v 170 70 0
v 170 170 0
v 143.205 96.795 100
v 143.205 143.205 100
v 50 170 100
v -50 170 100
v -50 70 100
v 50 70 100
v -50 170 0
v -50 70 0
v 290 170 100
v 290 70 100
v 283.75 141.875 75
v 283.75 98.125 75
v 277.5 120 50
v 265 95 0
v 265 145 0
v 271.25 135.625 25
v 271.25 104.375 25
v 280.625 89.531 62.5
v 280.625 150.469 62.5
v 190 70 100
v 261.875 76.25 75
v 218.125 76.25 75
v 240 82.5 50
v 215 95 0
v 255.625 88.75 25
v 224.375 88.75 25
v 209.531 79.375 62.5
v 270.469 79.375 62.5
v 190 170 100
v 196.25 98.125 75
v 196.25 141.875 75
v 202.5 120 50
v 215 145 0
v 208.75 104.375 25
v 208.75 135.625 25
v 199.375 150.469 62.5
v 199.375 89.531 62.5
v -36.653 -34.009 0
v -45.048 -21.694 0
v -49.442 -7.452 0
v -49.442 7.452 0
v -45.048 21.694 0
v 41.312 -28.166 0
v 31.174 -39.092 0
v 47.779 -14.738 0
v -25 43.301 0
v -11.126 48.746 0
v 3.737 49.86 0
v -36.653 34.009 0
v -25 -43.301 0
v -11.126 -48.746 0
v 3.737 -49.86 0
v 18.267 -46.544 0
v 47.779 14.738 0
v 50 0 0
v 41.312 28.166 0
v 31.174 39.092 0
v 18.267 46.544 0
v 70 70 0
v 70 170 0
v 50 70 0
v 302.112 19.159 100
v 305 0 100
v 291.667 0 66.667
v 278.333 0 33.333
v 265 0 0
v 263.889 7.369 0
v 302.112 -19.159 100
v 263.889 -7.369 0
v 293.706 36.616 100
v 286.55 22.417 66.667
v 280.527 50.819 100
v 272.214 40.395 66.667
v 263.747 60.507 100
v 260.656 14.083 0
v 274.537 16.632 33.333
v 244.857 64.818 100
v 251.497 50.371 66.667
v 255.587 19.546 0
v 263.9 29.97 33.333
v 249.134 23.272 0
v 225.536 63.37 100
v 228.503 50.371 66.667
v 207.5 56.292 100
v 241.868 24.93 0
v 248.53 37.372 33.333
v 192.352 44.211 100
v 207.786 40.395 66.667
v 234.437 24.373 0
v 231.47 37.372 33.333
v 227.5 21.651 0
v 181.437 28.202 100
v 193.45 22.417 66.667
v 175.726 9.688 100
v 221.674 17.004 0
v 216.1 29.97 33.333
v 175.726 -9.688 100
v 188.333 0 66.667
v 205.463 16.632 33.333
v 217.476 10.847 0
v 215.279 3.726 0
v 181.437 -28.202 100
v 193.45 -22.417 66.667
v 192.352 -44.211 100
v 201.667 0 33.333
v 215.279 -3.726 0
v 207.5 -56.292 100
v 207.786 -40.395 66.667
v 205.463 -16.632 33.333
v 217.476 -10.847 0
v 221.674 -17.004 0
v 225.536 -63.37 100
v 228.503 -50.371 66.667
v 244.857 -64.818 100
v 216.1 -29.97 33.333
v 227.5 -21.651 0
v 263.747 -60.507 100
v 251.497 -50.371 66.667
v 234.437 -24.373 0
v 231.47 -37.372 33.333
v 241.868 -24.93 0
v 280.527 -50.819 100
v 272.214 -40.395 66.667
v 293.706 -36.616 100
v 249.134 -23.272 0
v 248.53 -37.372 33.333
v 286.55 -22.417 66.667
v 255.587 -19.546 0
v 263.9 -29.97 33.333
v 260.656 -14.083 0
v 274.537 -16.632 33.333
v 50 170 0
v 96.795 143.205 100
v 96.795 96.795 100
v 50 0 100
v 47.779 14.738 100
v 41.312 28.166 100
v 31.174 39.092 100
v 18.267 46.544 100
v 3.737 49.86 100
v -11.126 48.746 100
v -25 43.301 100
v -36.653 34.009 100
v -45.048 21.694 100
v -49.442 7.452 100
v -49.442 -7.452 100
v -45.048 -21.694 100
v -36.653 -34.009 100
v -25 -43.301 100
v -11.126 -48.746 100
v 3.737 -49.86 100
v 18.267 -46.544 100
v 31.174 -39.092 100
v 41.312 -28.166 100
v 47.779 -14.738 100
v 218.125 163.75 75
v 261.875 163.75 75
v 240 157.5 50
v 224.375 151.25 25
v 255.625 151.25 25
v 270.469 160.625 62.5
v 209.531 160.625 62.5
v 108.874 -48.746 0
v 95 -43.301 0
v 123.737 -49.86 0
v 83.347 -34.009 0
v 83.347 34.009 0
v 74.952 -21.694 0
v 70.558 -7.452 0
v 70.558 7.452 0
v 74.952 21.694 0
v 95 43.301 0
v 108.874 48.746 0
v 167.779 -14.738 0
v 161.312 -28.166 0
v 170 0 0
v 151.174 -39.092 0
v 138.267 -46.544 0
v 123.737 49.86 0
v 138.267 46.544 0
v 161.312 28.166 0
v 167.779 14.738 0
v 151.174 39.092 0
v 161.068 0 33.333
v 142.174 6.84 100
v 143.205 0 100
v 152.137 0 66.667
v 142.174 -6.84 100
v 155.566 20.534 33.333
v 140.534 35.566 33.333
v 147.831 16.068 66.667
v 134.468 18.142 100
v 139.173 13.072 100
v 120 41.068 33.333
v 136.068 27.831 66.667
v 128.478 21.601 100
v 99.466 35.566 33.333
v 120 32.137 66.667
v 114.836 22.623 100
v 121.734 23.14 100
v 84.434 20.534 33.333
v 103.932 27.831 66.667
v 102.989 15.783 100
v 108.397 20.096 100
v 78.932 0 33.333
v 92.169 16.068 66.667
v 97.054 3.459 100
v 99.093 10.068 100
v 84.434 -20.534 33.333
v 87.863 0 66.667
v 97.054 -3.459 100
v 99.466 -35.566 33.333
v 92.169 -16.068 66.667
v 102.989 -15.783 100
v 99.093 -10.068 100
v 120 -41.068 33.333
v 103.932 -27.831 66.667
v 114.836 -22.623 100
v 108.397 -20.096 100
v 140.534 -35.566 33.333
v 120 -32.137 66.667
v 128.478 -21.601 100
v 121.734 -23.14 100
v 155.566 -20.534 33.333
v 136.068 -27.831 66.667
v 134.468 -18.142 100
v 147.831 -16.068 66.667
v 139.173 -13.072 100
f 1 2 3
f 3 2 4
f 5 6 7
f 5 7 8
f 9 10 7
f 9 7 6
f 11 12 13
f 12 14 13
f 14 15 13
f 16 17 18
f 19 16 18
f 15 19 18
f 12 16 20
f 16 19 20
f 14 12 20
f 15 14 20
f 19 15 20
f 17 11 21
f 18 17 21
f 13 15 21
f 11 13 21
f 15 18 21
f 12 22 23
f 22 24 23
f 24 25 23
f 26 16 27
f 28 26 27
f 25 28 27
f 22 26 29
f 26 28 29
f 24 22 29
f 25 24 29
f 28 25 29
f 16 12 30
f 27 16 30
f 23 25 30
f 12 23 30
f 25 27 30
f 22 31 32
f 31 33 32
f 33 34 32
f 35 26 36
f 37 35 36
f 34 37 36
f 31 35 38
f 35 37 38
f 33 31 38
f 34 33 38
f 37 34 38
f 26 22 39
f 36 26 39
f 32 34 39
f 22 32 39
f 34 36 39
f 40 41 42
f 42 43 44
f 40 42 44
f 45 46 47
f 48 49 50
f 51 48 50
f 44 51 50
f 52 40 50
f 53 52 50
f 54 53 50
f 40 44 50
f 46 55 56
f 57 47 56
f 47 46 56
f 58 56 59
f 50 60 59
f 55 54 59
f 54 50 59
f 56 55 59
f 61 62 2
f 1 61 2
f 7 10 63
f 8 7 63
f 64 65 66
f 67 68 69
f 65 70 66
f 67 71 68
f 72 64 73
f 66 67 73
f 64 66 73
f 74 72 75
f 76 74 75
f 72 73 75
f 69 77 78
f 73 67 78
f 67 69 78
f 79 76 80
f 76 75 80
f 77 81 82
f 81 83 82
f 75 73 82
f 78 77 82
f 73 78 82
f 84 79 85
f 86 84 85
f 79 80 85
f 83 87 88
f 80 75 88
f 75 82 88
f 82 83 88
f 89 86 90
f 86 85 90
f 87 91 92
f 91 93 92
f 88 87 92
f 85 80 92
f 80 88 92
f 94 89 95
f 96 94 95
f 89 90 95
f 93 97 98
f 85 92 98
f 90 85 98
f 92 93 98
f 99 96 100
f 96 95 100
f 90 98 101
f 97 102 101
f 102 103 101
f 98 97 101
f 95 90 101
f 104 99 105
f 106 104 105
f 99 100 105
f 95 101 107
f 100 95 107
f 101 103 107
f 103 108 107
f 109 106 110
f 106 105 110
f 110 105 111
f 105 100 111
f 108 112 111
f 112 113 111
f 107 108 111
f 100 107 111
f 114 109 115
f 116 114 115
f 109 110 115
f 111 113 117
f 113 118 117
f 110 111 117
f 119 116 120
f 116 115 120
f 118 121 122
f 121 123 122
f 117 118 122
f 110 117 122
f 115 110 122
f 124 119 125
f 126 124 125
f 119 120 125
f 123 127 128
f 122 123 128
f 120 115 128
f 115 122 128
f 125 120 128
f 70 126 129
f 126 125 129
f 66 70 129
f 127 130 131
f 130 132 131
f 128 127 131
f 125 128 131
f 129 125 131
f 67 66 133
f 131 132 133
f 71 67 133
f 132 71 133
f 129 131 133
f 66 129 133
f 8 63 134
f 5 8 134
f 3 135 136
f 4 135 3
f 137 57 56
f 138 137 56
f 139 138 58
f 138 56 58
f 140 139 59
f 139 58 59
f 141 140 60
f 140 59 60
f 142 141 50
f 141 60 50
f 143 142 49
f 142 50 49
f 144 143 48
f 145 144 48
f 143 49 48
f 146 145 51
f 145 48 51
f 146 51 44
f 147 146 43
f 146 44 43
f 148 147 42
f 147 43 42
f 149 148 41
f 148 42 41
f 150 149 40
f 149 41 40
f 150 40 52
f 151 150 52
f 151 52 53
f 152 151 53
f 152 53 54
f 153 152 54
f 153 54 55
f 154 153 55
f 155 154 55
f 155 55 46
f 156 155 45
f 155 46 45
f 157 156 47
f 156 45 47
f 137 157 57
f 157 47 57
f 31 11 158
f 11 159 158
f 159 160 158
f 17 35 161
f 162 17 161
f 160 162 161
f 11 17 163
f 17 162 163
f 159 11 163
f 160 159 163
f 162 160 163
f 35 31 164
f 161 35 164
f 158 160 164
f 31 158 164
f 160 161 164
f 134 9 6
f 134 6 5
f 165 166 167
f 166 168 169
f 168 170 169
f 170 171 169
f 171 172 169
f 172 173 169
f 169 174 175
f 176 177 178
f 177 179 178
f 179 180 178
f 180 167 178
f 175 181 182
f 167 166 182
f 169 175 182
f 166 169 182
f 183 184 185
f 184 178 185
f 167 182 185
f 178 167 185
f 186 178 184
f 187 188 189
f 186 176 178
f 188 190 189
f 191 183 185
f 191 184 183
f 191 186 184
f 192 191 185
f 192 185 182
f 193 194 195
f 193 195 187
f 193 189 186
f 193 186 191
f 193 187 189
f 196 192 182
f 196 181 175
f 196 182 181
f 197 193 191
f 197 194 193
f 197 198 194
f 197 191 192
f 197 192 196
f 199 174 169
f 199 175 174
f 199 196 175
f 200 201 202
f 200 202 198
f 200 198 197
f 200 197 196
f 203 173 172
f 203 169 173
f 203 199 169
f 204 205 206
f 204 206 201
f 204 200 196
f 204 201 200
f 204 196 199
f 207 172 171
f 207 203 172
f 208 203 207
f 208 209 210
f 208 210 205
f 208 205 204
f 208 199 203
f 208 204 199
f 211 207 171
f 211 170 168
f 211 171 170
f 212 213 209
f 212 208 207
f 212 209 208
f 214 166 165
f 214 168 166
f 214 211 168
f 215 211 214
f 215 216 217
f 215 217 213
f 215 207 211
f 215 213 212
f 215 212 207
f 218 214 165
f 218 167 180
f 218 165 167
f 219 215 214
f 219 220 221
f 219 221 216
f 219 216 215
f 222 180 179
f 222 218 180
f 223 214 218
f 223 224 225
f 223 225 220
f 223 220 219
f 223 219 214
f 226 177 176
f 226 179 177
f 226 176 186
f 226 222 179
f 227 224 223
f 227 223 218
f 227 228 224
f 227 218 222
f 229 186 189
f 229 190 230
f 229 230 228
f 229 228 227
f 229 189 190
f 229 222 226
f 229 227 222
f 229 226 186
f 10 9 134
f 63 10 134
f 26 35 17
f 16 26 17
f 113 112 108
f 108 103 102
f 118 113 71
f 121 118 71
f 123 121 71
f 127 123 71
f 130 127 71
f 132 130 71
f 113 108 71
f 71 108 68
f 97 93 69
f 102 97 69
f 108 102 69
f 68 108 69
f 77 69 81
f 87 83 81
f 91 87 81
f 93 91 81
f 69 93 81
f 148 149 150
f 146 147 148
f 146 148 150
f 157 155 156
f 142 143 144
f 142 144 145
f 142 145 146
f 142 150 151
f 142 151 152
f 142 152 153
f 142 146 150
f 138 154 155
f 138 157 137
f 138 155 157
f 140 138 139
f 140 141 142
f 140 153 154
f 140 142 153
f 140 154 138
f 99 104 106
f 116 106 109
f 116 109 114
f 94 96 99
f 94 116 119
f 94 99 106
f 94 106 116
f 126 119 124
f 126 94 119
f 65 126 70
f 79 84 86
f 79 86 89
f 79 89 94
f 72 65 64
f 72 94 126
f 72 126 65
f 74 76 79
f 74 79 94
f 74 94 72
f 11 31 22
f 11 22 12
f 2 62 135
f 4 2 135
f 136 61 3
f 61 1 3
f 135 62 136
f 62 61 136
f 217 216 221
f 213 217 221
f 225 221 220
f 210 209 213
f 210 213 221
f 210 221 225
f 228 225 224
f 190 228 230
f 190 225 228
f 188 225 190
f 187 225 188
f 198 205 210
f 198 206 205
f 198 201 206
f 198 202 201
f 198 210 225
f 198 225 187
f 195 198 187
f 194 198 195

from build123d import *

# Parameters (mm, degrees)
F0_R     = 50
F1_DEPTH = 100
F3_DEPTH = 100
F3_TAPER = 15
F4_R     = 65
F0_R_2   = 25
F0_W     = 100
F0_H     = 100
F6_DEPTH = 100
F6_TAPER = 15
F7_DEPTH = 100
F8_W     = 100
F8_H     = 100
F0_W_2   = 50
F0_H_2   = 50


with BuildPart() as f1:
    # F0 (on Top) → F1 (new body)
    with BuildSketch(Plane.XY):
        Circle(F0_R)
    extrude(amount=F1_DEPTH)


with BuildPart() as f3:
    # F0 (on Top) → F3 (new body)
    with BuildSketch(Plane.XY):
        with Locations((120, 0)):
            Circle(F0_R)
    extrude(amount=F3_DEPTH, taper=F3_TAPER)


with BuildPart() as f5:
    # F4 (on offset) → F5 section 0
    with BuildSketch(Plane.XY.offset(100)):
        with Locations((240, 0)):
            Circle(F4_R)
    # F0 (on Top) → F5 section 1
    with BuildSketch(Plane.XY):
        with Locations((240, 0)):
            Circle(F0_R_2)
    loft()


with BuildPart() as f6:
    # F0 (on Top) → F6 (new body)
    with BuildSketch(Plane.XY):
        with Locations((120, 120)):
            Rectangle(F0_W, F0_H)
    extrude(amount=F6_DEPTH, taper=F6_TAPER)


with BuildPart() as f7:
    # F0 (on Top) → F7 (new body)
    with BuildSketch(Plane.XY):
        with Locations((0, 120)):
            Rectangle(F0_W, F0_H)
    extrude(amount=F7_DEPTH)


with BuildPart() as f9:
    # F8 (on offset) → F9 section 0
    with BuildSketch(Plane.XY.offset(100)):
        with Locations((240, 120)):
            Rectangle(F8_W, F8_H)
    # F0 (on Top) → F9 section 1
    with BuildSketch(Plane.XY):
        with Locations((240, 120)):
            Rectangle(F0_W_2, F0_H_2)
    loft()


solid = Compound([f1.part, f3.part, f5.part, f6.part, f7.part, f9.part])
